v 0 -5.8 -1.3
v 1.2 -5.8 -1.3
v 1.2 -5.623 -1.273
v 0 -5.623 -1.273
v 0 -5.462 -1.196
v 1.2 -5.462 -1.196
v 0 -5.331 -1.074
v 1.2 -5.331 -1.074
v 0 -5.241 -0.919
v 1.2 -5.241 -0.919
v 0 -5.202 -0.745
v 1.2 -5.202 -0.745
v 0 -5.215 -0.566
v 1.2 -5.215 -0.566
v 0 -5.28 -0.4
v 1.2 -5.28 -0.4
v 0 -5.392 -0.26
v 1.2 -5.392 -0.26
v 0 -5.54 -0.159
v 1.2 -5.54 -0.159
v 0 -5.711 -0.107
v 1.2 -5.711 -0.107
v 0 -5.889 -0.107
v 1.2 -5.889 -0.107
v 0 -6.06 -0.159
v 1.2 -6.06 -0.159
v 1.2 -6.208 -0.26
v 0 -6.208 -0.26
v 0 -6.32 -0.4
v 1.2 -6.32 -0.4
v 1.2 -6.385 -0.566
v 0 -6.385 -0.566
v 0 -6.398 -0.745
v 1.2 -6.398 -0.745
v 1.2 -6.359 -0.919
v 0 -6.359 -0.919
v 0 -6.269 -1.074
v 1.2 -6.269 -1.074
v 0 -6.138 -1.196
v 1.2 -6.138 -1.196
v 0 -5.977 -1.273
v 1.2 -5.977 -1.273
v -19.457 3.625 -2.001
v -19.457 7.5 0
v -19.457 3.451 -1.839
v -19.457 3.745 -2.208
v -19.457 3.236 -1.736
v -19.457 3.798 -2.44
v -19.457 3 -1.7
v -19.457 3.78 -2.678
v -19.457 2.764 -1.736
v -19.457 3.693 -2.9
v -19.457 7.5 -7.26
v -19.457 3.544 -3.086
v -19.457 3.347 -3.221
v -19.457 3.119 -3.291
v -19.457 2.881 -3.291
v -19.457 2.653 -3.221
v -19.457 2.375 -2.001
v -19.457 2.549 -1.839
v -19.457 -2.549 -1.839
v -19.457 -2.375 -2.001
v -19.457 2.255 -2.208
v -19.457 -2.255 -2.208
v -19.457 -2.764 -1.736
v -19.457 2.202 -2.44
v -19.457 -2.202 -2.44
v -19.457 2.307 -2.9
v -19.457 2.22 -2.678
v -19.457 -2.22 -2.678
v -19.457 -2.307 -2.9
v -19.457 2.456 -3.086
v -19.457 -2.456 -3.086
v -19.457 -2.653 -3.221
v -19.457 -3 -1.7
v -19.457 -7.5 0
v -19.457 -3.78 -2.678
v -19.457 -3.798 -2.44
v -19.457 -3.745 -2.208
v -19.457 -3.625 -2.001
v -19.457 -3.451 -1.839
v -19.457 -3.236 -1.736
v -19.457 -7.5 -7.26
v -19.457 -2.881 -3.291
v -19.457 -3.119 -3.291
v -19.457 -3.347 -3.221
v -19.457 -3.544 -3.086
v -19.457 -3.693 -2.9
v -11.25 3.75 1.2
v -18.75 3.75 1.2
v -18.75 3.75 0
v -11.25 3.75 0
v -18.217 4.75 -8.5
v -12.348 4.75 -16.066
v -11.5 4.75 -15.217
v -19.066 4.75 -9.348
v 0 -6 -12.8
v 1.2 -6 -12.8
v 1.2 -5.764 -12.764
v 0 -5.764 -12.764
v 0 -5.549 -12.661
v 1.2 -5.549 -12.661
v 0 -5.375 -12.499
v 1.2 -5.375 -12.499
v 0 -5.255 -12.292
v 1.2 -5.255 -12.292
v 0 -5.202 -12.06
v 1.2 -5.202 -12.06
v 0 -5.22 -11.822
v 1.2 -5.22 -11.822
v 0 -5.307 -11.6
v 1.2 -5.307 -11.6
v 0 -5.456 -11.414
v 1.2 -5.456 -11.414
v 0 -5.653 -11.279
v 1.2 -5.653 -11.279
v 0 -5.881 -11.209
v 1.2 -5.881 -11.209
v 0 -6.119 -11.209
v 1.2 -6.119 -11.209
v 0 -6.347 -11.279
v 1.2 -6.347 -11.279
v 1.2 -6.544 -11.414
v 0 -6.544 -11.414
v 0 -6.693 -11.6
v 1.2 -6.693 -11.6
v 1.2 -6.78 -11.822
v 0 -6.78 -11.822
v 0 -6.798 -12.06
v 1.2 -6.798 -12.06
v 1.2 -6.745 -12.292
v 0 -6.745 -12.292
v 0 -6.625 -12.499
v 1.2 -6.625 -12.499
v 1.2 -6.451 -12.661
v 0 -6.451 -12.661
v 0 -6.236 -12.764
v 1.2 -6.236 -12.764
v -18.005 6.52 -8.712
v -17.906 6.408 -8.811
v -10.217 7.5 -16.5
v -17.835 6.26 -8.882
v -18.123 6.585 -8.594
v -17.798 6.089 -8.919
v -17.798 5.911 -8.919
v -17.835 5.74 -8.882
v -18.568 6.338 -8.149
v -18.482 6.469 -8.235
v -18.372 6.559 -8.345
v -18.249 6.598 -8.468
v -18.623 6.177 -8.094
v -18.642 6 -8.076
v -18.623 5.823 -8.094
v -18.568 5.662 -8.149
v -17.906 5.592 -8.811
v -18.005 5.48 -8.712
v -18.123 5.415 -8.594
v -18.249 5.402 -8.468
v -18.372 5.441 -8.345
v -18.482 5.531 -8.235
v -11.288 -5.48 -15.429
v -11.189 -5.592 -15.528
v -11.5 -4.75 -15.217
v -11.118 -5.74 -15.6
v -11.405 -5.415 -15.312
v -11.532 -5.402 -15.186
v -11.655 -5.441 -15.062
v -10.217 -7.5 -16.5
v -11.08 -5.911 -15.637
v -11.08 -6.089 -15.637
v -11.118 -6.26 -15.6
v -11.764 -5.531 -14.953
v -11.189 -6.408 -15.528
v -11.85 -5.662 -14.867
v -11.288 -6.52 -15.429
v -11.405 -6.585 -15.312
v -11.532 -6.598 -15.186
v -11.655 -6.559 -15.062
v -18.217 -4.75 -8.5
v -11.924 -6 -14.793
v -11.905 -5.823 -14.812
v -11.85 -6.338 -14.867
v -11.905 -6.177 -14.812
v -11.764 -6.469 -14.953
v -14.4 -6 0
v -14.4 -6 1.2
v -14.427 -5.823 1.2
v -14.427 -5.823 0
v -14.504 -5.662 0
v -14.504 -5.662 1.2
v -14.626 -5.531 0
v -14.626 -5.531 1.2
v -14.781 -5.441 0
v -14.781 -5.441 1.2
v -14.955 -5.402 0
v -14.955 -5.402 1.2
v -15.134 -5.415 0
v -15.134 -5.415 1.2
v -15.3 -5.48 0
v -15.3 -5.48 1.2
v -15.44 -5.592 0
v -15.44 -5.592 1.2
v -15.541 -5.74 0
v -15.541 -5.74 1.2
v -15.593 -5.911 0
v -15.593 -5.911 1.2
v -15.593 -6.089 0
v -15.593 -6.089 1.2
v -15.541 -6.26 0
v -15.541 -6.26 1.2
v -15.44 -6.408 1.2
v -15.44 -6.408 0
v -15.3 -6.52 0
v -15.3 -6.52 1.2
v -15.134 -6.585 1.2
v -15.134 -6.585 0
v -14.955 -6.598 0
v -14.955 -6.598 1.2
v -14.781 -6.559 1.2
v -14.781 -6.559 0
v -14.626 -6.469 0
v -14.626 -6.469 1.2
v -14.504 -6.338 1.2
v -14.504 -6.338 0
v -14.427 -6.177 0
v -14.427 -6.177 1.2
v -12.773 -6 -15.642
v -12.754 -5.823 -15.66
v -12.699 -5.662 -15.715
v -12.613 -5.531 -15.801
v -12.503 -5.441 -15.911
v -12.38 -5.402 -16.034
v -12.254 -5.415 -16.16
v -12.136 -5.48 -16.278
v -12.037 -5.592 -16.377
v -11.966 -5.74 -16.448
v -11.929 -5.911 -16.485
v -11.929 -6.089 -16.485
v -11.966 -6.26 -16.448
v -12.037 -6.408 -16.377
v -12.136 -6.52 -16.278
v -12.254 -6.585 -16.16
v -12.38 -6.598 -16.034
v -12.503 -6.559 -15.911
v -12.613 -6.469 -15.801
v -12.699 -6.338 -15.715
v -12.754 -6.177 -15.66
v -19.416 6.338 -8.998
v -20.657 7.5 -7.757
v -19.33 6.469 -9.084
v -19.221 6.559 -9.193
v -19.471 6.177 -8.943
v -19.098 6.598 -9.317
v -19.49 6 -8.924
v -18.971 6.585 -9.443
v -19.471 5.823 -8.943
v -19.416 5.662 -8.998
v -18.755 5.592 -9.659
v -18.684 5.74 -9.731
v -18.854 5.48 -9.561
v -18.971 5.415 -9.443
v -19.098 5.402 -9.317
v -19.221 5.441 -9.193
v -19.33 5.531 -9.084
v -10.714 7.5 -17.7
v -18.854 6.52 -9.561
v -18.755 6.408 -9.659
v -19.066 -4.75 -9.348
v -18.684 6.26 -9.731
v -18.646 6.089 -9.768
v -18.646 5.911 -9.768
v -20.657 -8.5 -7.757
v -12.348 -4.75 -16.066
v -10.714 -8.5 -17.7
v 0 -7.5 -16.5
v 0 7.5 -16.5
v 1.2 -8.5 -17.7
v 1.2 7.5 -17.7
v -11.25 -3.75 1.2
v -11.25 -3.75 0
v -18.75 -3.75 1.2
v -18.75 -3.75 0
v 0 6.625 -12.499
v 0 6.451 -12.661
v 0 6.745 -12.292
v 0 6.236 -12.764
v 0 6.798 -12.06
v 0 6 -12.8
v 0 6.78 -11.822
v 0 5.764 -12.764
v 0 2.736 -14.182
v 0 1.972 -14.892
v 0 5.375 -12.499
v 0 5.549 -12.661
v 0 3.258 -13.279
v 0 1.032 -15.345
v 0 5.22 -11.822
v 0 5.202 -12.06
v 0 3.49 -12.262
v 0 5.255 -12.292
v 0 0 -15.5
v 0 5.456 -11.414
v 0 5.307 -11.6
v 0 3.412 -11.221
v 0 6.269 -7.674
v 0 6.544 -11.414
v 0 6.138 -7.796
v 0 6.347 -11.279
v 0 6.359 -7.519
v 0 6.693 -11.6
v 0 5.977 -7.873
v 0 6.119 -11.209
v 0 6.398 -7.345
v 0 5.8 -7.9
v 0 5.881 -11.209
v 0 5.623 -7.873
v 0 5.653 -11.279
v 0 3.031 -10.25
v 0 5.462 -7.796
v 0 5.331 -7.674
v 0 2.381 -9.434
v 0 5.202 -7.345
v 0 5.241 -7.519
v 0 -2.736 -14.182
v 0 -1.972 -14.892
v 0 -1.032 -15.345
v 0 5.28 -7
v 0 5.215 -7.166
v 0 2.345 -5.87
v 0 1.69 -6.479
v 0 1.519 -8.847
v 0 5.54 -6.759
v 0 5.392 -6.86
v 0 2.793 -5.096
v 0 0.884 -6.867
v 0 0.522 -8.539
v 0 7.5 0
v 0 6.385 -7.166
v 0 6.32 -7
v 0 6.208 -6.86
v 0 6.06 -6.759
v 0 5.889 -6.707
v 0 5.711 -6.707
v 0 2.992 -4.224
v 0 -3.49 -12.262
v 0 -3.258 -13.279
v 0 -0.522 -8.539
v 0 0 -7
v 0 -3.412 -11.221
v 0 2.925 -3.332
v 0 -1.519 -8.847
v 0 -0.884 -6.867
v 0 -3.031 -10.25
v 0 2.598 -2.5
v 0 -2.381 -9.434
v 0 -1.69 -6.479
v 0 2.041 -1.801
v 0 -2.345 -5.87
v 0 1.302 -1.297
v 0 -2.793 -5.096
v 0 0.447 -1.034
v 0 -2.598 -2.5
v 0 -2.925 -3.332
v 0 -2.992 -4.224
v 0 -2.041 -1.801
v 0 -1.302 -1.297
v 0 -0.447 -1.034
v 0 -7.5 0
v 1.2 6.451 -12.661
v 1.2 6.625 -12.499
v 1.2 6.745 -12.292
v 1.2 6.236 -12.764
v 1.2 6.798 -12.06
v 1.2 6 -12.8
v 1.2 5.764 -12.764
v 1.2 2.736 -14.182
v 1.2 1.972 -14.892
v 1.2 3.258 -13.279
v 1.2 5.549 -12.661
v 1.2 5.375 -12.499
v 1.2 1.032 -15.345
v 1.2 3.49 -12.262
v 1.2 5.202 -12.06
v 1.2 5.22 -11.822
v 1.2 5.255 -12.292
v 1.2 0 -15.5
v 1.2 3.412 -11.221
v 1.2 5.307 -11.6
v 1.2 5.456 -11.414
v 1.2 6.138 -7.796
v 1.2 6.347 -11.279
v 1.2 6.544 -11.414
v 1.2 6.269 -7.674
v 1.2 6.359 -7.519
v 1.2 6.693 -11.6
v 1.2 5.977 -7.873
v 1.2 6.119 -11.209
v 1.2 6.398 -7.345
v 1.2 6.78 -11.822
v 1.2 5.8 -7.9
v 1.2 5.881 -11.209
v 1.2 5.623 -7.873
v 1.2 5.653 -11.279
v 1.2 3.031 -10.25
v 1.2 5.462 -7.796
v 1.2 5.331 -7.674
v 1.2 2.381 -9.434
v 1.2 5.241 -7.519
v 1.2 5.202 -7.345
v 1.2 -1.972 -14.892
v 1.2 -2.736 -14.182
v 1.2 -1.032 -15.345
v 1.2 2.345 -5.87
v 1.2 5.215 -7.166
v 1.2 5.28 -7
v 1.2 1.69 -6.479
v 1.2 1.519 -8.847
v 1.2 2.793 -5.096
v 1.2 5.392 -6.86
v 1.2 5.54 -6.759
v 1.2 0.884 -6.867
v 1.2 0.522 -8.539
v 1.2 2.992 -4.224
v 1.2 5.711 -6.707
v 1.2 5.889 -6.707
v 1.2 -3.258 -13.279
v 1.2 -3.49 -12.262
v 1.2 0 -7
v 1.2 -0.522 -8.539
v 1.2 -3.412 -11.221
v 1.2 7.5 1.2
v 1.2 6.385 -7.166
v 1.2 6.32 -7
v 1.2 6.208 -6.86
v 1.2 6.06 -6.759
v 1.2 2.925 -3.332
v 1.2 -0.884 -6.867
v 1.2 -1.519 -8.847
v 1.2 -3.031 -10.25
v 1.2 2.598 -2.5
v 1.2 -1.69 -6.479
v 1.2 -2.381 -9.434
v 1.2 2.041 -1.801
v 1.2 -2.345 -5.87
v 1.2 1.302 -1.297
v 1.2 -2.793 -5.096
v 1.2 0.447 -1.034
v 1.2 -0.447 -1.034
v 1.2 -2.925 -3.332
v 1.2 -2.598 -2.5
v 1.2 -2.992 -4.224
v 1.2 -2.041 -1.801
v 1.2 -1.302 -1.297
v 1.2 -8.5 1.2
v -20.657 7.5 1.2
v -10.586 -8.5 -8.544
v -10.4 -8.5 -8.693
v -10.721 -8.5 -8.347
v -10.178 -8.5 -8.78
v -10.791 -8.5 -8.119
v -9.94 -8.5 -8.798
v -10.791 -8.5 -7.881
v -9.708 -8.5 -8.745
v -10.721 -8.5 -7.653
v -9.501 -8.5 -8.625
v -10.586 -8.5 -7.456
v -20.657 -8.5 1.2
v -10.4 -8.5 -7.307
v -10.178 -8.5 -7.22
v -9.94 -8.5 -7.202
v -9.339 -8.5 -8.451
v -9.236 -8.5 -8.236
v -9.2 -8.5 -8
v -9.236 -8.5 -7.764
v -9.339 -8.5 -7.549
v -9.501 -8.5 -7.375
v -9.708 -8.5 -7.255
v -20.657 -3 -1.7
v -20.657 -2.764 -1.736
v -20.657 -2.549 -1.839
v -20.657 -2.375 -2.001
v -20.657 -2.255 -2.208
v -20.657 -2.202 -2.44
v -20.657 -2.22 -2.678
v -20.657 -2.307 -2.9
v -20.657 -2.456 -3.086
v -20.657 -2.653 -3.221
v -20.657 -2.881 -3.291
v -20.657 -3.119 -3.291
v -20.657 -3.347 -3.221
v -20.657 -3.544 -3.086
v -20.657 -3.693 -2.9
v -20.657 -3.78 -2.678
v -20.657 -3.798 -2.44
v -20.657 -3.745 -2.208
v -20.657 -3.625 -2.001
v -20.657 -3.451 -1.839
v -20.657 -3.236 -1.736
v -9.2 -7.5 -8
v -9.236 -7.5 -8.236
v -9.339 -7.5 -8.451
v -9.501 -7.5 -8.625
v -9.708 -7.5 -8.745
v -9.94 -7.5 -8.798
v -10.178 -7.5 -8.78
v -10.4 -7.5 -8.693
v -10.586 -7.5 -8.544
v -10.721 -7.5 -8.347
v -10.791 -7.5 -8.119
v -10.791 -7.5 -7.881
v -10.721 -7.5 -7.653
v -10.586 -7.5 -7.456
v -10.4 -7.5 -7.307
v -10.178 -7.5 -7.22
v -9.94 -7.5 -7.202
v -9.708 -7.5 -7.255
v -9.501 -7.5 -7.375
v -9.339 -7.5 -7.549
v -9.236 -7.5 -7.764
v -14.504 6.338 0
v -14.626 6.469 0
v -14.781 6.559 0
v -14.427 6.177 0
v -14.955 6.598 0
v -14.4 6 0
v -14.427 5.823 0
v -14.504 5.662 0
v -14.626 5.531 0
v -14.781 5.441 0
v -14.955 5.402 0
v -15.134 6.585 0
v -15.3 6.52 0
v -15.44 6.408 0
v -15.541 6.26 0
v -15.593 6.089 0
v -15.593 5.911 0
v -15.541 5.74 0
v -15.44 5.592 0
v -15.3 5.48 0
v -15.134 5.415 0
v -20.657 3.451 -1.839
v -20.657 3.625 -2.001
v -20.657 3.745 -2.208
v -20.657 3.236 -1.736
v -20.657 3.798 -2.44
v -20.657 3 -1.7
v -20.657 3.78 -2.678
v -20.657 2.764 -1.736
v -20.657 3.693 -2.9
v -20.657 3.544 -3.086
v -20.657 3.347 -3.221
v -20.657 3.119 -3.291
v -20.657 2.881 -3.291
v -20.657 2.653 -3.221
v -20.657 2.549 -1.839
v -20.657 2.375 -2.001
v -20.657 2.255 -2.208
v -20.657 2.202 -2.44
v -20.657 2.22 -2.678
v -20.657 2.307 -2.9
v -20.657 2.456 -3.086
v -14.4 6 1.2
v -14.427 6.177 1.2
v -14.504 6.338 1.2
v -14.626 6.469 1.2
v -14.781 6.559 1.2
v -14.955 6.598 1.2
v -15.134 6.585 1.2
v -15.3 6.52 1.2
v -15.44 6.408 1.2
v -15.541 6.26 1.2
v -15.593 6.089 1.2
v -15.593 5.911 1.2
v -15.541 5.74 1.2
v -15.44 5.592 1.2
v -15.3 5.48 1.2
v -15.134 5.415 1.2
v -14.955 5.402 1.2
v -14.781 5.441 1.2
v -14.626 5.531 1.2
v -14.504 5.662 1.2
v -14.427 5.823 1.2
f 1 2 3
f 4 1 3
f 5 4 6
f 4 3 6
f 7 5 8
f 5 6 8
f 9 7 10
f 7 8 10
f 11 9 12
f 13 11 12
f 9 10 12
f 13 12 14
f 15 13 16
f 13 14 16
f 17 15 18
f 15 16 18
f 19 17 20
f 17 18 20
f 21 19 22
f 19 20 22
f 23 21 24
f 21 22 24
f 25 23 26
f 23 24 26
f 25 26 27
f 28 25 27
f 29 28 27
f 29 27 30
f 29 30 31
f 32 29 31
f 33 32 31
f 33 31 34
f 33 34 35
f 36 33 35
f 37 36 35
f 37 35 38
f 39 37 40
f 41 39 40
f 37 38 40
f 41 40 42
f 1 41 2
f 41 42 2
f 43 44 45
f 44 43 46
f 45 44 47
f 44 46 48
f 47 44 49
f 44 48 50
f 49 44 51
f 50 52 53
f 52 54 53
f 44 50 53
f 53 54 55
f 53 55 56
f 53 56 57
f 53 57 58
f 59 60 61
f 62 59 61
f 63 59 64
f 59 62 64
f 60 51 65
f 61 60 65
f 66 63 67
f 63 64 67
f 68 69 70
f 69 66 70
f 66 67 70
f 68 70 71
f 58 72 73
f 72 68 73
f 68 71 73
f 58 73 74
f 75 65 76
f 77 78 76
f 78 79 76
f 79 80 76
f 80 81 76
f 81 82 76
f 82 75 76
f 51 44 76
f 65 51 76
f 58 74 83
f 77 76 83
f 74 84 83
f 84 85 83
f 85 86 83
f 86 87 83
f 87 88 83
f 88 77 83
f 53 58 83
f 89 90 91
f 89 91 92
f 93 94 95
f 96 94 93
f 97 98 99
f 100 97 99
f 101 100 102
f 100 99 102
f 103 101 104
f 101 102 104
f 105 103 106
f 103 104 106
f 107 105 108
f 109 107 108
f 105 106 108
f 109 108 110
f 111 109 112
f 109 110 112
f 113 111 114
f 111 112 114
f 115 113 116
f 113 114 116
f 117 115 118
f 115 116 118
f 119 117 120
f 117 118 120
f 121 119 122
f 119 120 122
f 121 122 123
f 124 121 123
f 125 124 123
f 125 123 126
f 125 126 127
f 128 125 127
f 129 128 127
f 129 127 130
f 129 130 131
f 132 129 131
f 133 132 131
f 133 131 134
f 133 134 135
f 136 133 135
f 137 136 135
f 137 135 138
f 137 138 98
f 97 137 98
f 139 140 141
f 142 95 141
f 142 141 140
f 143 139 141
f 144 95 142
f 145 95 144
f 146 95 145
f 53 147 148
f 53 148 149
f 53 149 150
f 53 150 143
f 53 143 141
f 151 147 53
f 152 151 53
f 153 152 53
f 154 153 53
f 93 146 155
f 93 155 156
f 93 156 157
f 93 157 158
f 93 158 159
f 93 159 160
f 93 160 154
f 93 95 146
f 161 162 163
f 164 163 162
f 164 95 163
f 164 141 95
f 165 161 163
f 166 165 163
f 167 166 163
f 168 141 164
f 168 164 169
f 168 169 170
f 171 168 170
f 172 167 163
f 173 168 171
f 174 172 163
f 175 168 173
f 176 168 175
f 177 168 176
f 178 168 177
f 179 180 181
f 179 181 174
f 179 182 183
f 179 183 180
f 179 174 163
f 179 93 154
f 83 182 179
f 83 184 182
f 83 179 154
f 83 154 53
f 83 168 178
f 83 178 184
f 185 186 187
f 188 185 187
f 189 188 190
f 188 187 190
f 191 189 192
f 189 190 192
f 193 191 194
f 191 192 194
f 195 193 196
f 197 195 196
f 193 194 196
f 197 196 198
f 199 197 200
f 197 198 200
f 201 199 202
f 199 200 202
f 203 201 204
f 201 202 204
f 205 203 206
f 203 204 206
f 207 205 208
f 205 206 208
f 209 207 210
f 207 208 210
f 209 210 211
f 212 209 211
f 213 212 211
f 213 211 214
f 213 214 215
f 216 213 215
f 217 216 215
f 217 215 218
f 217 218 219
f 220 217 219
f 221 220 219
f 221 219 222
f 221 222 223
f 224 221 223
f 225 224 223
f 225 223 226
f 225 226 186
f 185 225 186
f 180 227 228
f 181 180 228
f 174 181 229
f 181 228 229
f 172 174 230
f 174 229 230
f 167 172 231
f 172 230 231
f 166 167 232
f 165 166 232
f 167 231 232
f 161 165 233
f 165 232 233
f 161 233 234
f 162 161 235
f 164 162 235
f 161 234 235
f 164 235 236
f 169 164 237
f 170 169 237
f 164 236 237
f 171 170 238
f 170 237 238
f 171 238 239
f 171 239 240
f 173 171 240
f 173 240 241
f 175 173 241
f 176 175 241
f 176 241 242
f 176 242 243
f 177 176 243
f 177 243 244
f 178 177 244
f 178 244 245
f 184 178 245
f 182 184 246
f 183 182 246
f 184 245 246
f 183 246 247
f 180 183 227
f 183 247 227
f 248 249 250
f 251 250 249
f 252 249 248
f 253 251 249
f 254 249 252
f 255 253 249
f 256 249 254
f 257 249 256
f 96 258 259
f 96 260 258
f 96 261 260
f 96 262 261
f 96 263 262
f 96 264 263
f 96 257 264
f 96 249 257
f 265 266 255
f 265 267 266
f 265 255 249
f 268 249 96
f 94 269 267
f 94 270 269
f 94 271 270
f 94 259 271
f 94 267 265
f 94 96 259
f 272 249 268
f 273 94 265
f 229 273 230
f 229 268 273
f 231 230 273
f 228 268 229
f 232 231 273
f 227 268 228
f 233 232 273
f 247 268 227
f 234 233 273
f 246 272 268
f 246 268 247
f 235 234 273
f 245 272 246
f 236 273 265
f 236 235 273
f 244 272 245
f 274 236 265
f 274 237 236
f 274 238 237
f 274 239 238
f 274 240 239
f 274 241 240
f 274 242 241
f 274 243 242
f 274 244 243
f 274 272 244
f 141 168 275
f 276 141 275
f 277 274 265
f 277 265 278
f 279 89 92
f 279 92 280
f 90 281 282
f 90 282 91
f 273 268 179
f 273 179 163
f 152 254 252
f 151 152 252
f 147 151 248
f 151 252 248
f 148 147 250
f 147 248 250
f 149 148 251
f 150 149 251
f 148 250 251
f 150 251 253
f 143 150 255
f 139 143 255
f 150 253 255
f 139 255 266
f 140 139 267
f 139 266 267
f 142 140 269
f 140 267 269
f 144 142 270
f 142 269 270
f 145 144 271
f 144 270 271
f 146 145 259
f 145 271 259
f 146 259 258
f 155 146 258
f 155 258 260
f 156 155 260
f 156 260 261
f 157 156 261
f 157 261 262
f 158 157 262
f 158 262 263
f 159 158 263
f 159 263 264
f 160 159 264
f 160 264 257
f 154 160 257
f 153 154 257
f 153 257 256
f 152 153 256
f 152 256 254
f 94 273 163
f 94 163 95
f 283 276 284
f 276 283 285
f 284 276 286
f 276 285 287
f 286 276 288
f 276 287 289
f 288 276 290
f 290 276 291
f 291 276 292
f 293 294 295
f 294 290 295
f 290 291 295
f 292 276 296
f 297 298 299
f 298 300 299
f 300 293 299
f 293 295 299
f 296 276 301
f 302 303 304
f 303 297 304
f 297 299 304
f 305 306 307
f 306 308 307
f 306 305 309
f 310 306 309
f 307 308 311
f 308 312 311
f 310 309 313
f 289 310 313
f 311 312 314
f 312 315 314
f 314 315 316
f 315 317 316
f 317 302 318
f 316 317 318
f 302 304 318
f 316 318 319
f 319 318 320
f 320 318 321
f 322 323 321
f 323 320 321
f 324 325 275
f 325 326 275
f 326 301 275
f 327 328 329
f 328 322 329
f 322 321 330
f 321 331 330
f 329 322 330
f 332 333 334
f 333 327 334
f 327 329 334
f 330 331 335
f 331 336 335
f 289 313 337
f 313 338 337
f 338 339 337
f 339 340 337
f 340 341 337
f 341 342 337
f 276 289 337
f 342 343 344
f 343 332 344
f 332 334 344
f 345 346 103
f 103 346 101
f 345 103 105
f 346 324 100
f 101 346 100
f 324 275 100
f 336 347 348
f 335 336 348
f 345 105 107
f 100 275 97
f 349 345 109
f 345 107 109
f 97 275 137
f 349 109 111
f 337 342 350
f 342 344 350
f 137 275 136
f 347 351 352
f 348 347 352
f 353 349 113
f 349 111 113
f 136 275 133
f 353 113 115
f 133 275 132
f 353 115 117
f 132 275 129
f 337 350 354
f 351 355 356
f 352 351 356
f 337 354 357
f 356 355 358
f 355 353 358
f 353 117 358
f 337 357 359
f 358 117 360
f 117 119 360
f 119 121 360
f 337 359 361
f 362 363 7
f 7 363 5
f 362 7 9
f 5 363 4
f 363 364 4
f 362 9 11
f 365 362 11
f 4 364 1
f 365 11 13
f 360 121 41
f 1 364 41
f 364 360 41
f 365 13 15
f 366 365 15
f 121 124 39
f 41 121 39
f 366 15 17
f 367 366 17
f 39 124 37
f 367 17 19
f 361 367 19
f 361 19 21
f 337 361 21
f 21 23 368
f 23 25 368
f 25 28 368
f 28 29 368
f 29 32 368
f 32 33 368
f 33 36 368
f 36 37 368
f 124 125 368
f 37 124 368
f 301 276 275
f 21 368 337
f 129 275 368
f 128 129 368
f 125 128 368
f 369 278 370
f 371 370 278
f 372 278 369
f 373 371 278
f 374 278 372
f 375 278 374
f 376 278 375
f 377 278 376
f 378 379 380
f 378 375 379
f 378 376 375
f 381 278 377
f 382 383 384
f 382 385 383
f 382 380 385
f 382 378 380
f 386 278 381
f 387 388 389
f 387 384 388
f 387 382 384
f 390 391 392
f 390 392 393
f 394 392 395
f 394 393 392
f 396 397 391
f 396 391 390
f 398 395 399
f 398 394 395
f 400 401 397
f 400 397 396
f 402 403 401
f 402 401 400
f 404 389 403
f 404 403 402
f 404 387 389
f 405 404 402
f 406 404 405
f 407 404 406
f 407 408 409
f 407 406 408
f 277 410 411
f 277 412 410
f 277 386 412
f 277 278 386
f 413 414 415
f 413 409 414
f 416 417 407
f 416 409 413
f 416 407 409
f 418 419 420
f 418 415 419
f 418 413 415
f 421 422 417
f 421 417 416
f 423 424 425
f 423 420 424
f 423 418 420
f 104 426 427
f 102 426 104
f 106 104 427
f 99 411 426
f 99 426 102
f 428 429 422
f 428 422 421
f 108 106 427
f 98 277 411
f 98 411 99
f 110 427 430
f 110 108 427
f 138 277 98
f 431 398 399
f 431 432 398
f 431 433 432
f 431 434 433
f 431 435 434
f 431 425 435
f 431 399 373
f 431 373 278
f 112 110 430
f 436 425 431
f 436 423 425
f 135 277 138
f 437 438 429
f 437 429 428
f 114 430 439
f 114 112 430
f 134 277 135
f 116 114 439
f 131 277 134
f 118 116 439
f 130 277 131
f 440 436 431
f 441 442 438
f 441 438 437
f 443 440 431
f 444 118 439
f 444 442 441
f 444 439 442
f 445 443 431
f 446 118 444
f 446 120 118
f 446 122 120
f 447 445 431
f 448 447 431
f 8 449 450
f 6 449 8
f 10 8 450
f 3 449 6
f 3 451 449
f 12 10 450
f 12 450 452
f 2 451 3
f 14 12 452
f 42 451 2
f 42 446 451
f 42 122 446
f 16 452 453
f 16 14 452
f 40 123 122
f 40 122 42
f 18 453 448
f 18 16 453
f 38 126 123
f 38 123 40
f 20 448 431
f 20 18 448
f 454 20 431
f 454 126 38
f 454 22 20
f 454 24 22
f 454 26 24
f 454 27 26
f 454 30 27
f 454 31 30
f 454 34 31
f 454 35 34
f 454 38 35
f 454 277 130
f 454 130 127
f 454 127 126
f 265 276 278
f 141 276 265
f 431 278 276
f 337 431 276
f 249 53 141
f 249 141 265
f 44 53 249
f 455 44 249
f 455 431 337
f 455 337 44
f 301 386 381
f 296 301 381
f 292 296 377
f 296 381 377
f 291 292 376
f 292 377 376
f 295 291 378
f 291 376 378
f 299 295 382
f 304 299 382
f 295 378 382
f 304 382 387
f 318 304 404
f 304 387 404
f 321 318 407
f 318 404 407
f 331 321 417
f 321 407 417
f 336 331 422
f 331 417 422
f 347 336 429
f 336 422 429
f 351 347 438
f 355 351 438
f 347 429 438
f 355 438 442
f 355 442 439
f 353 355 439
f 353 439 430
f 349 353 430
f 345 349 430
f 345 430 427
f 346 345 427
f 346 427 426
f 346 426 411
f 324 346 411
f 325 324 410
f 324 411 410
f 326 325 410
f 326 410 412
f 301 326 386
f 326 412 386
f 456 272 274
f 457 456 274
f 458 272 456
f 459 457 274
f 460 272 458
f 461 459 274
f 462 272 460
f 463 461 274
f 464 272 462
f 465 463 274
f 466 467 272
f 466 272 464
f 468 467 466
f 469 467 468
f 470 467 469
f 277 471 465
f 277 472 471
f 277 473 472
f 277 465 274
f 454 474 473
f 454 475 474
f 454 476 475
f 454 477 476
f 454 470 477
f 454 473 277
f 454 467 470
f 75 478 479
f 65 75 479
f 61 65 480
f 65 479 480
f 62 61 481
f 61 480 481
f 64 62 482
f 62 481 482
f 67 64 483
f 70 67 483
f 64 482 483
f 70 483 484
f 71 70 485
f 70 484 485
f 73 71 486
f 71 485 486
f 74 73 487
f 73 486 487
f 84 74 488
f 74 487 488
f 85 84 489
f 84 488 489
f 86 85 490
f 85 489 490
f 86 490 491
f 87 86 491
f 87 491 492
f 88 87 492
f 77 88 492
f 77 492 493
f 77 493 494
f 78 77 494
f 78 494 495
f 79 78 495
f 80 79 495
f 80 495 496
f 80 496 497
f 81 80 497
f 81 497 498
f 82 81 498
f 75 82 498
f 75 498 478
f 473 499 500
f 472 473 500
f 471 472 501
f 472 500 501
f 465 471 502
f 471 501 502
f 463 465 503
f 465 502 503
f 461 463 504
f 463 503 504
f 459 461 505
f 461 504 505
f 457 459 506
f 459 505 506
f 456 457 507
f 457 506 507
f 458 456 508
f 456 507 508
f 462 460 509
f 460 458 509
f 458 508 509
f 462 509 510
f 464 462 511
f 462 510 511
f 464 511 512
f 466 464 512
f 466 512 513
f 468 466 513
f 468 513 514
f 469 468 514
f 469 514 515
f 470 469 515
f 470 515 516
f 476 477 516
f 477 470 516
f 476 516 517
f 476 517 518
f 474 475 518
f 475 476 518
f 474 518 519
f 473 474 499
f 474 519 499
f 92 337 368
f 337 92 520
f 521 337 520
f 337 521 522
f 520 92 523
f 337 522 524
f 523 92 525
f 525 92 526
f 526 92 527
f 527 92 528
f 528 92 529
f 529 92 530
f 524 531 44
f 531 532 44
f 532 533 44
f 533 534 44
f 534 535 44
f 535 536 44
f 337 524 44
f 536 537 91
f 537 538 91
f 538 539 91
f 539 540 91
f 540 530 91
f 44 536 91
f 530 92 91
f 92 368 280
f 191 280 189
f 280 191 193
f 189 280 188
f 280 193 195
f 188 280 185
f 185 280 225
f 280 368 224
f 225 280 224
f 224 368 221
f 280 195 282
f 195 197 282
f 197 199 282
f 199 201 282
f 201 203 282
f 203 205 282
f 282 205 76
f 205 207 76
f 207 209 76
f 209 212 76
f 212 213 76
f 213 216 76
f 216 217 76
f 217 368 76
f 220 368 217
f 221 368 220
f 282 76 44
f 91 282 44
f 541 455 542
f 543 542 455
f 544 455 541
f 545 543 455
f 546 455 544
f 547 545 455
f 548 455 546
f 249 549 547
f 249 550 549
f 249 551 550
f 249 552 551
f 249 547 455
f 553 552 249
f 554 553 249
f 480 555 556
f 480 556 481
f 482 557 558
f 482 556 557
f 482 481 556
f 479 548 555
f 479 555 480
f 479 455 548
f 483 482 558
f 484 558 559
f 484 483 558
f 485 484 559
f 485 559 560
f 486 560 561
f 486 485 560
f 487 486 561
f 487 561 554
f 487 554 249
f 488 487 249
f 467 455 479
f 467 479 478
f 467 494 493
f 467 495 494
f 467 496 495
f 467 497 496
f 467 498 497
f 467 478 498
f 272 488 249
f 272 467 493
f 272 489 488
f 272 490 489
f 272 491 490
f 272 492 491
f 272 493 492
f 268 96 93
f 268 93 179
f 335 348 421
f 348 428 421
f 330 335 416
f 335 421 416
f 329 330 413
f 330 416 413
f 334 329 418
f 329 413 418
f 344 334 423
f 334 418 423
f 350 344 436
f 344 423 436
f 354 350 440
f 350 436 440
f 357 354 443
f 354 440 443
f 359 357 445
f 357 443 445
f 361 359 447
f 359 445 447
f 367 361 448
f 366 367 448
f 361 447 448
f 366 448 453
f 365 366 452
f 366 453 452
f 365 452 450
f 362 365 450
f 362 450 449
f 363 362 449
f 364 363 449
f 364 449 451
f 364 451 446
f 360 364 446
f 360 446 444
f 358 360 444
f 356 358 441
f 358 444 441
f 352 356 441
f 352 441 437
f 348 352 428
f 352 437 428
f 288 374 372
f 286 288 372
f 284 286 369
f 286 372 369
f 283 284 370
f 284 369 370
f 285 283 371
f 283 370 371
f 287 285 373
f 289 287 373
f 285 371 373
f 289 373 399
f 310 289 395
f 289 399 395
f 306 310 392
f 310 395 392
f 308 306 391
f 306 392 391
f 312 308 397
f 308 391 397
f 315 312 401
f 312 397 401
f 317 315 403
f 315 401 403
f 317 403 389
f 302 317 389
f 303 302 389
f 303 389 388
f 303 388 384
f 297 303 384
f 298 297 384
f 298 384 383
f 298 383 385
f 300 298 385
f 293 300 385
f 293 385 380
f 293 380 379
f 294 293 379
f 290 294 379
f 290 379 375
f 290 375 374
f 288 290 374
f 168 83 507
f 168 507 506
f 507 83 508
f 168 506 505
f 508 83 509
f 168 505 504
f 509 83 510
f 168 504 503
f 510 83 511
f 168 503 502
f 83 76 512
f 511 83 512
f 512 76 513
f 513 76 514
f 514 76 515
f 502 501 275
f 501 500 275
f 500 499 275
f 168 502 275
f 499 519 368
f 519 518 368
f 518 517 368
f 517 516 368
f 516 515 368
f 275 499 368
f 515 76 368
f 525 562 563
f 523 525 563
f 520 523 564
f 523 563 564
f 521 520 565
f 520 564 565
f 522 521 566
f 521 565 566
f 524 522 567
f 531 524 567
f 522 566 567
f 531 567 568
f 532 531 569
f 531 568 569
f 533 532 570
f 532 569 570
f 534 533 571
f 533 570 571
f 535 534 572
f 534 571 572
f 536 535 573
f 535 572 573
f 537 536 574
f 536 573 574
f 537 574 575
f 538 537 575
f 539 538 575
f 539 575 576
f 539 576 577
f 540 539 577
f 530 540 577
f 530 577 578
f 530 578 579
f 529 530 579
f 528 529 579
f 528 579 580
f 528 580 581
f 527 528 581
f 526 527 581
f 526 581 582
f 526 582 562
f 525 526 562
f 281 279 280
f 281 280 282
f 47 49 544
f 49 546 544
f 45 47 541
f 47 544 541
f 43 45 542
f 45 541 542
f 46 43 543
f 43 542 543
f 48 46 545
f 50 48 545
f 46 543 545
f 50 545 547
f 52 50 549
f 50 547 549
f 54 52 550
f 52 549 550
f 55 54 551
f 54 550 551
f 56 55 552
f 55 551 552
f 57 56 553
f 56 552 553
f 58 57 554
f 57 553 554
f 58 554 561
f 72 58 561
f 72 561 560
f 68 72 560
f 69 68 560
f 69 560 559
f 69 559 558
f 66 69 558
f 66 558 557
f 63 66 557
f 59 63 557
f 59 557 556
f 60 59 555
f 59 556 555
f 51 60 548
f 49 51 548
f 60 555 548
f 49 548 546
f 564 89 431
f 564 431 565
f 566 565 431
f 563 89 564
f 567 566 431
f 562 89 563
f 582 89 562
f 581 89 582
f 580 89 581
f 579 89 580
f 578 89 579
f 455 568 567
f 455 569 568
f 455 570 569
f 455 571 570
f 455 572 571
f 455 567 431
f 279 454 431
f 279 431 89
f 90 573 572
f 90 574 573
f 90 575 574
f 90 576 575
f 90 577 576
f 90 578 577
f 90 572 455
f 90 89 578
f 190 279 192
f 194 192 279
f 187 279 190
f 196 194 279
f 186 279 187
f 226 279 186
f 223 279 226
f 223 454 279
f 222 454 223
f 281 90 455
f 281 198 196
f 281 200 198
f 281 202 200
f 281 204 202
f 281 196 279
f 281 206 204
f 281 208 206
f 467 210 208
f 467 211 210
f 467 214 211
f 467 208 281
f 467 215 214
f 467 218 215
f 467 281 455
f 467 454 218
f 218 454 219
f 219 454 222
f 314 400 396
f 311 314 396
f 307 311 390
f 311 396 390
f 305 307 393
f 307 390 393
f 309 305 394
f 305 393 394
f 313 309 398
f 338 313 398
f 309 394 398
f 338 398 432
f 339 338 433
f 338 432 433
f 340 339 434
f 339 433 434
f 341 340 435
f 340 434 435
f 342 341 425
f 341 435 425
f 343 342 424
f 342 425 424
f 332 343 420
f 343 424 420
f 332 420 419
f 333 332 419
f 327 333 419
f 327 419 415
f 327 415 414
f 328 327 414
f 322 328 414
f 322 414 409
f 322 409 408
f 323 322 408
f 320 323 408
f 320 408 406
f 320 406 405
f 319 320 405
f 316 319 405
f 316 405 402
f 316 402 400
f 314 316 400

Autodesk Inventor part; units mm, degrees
ref_plane "YZ Plane" through (0, 0, 0) normal (1, 0, 0) x (0, 1, 0)
ref_plane "XZ Plane" through (0, 0, 0) normal (0, 1, 0) x (-1, 0, 0)
ref_plane "XY Plane" through (0, 0, 0) normal (0, 0, 1) x (1, 0, 0)
sketch "Sketch1" plane through (0, 0, 0) normal (0, 1, 0) x (-1, 0, 0)
  line L0 (0, -4) -> (15, -4) construction
  line L1 (15, -4) -> (15, -12) construction
  line L2 (15, -12) -> (-4.6836, -12) construction
  line L3 (0, 0) -> (19.4569, 0)
  line L4 (19.4569, 0) -> (19.4569, -7.2603)
  line L5 (10.2172, -16.5) -> (0, -16.5)
  line L6 (0, -16.5) -> (0, 0)
  line L7 (-1.2, 1.2) -> (20.6569, 1.2)
  line L8 (20.6569, 1.2) -> (20.6569, -7.7574)
  line L9 (10.7142, -17.7) -> (-1.2, -17.7)
  line L10 (-1.2, -17.7) -> (-1.2, 1.2)
  line L11 (10.2172, -16.5) -> (19.4569, -7.2603)
  line L12 (20.6569, -7.7574) -> (10.7142, -17.7)
  line L13 (15, -12) -> (15.7071, -12.7071) construction
  line L14 (17.4749, -6.4749) -> (12.5251, -1.5251) construction
  line L15 (12.5251, -1.5251) -> (13.2676, -0.7827) construction
  line L16 (17.4749, -6.4749) -> (18.2173, -5.7324) construction
  line L17 (18.2173, -5.7324) -> (13.2676, -0.7827) construction
  line L18 (15, -12) -> (16.1863, -13.1863) construction
  point P0 (15, -8)
  dimension "d0" = 1.2
  dimension "d1" = 1.2
  dimension "d2" = 1.2
  dimension "d3" = 4
  dimension "d4" = 4.5
  dimension "d5" = 8
  dimension "d6" = 15
  dimension "d8" = 135
  dimension "d9" = 1.2
  dimension "d10" = 1.2
  dimension "d11" = 1
  dimension "d12" = 7
  dimension "d13" = 45
  dimension "d20" = 7
  dimension "d21" = 1.05
  dimension "d49" = 1.2395
  dimension "d68" = 4.4569
  dimension "d69" = 8
extrude "Extrusion1" add sketch "Sketch1" along normal mid plane 15
sketch "Sketch2" plane through (1.2, -7.5, -17.7) normal (1, 0, 0) x (0, 0, -1)
  circle A0 centre (-5.7, 7.5) radius 3.5
  circle A1 centre (-13.7, 7.5) radius 3
  circle A2 centre (-10.4, 13.3) radius 0.6
  circle A3 centre (-17, 1.7) radius 0.6
  line L0 (-10.4, 13.3) -> (-17, 1.7) construction
  line L1 (-16.7, 7.5) -> (-16.7, 7.5)
  circle A4 centre (-9.7, 1.5) radius 0.8
  line L2 (0, 0) -> (-18.9, 0) projected
  line L3 (-13.7, 7.5) -> (-5.7, 7.5) construction
  circle A5 centre (-5.7, 13.5) radius 0.8
  circle A6 centre (-5.7, 1.5) radius 0.8
  line L4 (-5.7, 1.5) -> (-5.7, 13.5) construction
  point P0 (-17.7, 7.5)
  point P1 (-5.7, 7.5)
  point P2 (-9.7, 7.5)
  dimension "d22" = 7
  dimension "d23" = 6
  dimension "d56" = 5.8
  dimension "d57" = 3.3
  dimension "d58" = 1.2
  dimension "d59" = 3
  dimension "d66" = 1.6
  dimension "d67" = 1.5
  dimension "d74" = 6
extrude "Extrusion2" cut sketch "Sketch2" against normal blind 3 contours A0 | A1 | A2 | A3 | A5 | A6
sketch "Sketch3" plane through (-20.6569, -7.5, 1.2) normal (-1, 0, 0) x (0, 0, 1)
  circle A0 centre (-3.7, 10.5) radius 0.8
  circle A1 centre (-5.2, 7.5) radius 0.8 construction
  circle A2 centre (-3.7, 4.5) radius 0.8
  line L0 (-11.5, 6.75) -> (-11.5, 8.25)
  line L1 (-9.9, 6.75) -> (-9.9, 8.25)
  arc A3 (-9.9, 8.25) -> (-11.5, 8.25) centre (-10.7, 8.25) ccw
  arc A4 (-11.5, 6.75) -> (-9.9, 6.75) centre (-10.7, 6.75) ccw
  line L2 (-3.7, 4.5) -> (-3.7, 10.5) construction
  point P0 (-1.2, 7.5)
  point P1 (-5.2, 7.5)
  point P2 (-10.7, 7.5)
  point P3 (-11.5, 7.5)
  point P4 (-3.7, 7.5)
  dimension "d28" = 1.6
  dimension "d32" = 5.5
  dimension "d52" = 1.5
  dimension "d53" = 0.8
  dimension "d64" = 6
  dimension "d65" = 1.5
extrude "Extrusion3" cut sketch "Sketch3" against normal blind 2 contours A0 | A2
sketch "Sketch4" plane through (-20.6569, -7.5, -7.7574) normal (-0.7071, 0, -0.7071) x (-0.7071, 0, 0.7071)
  line L0 (-11.75, 12.25) -> (-2.25, 12.25)
  line L1 (-2.25, 12.25) -> (-2.25, 2.75)
  line L2 (-2.25, 2.75) -> (-11.75, 2.75)
  line L3 (-11.75, 2.75) -> (-11.75, 12.25)
  circle A0 centre (-11.75, 13.5) radius 0.6
  circle A1 centre (-2.25, 13.5) radius 0.6
  circle A2 centre (-11.75, 1.5) radius 0.6
  circle A3 centre (-2.25, 1.5) radius 0.6
  point P0 (-9.1213, 7.5)
  point P1 (-7, 7.5)
  point P2 (-7, 7.5)
  point P3 (-7, 7.5)
  point P4 (-11.75, 7.5)
  point P5 (-7, 12.25)
  dimension "d35" = 9.5
  dimension "d36" = 6
  dimension "d37" = 6
  dimension "d38" = 1.2
extrude "Extrusion4" cut sketch "Sketch4" against normal blind 2 contours L0 L1 L2 L3 | A1 | A2
sketch "Sketch5" plane through (-20.6569, 7.5, 1.2) normal (0, 0, 1) x (1, 0, 0)
  line L0 (1.9069, -3.75) -> (9.4069, -3.75)
  line L1 (9.4069, -3.75) -> (9.4069, -11.25)
  line L2 (9.4069, -11.25) -> (1.9069, -11.25)
  line L3 (1.9069, -11.25) -> (1.9069, -3.75)
  circle A0 centre (5.6569, -1.5) radius 0.6
  circle A1 centre (5.6569, -13.5) radius 0.6
  arc A2 (13.6569, -12.7) -> (13.6569, -14.3) centre (13.6569, -13.5) ccw
  arc A3 (17.6569, -14.3) -> (17.6569, -12.7) centre (17.6569, -13.5) ccw
  line L4 (13.6569, -12.7) -> (17.6569, -12.7)
  line L5 (13.6569, -14.3) -> (17.6569, -14.3)
  point P0 (20.6569, -7.5)
  point P1 (5.6569, -7.5)
  point P2 (5.6569, -7.5)
  point P3 (5.6569, -7.5)
  point P4 (9.4069, -7.5)
  point P5 (5.6569, -3.75)
  point P6 (15.6569, -12.7)
  dimension "d41" = 7.5
  dimension "d42" = 6
  dimension "d43" = 6
  dimension "d44" = 1.2
  dimension "d70" = 1.6
  dimension "d71" = 6
  dimension "d72" = 10
  dimension "d73" = 4
extrude "Extrusion5" cut sketch "Sketch5" against normal blind 2 contours L0 L1 L2 L3 | A0 | A1
sketch "Sketch6" plane through (0, -7.5, 0) normal (0, -1, 0) x (1, 0, 0)
  line L0 (1.2, -17.7) -> (1.2, 1.2) projected
  line L1 (1.2, 1.2) -> (-20.6569, 1.2) projected
  line L2 (-20.6569, 1.2) -> (-20.6569, -7.7574) projected
  line L3 (-20.6569, -7.7574) -> (-10.7142, -17.7) projected
  line L4 (-10.7142, -17.7) -> (1.2, -17.7) projected
  line L5 (-15, -4) -> (-15, -12) construction
  line L6 (1.2, -10.187) -> (1.2, -11.787) projected
  circle A0 centre (-15, -8) radius 0.8
  circle A1 centre (-10, -8) radius 0.8
  point P0 (0, 0)
  dimension "d61" = 1.6
  dimension "d62" = 5
extrude "Extrusion6" add sketch "Sketch6" along normal blind 1 contours L4 L3 L2 L1 L0 | A0
properties part number "tactic2 chassis2"
